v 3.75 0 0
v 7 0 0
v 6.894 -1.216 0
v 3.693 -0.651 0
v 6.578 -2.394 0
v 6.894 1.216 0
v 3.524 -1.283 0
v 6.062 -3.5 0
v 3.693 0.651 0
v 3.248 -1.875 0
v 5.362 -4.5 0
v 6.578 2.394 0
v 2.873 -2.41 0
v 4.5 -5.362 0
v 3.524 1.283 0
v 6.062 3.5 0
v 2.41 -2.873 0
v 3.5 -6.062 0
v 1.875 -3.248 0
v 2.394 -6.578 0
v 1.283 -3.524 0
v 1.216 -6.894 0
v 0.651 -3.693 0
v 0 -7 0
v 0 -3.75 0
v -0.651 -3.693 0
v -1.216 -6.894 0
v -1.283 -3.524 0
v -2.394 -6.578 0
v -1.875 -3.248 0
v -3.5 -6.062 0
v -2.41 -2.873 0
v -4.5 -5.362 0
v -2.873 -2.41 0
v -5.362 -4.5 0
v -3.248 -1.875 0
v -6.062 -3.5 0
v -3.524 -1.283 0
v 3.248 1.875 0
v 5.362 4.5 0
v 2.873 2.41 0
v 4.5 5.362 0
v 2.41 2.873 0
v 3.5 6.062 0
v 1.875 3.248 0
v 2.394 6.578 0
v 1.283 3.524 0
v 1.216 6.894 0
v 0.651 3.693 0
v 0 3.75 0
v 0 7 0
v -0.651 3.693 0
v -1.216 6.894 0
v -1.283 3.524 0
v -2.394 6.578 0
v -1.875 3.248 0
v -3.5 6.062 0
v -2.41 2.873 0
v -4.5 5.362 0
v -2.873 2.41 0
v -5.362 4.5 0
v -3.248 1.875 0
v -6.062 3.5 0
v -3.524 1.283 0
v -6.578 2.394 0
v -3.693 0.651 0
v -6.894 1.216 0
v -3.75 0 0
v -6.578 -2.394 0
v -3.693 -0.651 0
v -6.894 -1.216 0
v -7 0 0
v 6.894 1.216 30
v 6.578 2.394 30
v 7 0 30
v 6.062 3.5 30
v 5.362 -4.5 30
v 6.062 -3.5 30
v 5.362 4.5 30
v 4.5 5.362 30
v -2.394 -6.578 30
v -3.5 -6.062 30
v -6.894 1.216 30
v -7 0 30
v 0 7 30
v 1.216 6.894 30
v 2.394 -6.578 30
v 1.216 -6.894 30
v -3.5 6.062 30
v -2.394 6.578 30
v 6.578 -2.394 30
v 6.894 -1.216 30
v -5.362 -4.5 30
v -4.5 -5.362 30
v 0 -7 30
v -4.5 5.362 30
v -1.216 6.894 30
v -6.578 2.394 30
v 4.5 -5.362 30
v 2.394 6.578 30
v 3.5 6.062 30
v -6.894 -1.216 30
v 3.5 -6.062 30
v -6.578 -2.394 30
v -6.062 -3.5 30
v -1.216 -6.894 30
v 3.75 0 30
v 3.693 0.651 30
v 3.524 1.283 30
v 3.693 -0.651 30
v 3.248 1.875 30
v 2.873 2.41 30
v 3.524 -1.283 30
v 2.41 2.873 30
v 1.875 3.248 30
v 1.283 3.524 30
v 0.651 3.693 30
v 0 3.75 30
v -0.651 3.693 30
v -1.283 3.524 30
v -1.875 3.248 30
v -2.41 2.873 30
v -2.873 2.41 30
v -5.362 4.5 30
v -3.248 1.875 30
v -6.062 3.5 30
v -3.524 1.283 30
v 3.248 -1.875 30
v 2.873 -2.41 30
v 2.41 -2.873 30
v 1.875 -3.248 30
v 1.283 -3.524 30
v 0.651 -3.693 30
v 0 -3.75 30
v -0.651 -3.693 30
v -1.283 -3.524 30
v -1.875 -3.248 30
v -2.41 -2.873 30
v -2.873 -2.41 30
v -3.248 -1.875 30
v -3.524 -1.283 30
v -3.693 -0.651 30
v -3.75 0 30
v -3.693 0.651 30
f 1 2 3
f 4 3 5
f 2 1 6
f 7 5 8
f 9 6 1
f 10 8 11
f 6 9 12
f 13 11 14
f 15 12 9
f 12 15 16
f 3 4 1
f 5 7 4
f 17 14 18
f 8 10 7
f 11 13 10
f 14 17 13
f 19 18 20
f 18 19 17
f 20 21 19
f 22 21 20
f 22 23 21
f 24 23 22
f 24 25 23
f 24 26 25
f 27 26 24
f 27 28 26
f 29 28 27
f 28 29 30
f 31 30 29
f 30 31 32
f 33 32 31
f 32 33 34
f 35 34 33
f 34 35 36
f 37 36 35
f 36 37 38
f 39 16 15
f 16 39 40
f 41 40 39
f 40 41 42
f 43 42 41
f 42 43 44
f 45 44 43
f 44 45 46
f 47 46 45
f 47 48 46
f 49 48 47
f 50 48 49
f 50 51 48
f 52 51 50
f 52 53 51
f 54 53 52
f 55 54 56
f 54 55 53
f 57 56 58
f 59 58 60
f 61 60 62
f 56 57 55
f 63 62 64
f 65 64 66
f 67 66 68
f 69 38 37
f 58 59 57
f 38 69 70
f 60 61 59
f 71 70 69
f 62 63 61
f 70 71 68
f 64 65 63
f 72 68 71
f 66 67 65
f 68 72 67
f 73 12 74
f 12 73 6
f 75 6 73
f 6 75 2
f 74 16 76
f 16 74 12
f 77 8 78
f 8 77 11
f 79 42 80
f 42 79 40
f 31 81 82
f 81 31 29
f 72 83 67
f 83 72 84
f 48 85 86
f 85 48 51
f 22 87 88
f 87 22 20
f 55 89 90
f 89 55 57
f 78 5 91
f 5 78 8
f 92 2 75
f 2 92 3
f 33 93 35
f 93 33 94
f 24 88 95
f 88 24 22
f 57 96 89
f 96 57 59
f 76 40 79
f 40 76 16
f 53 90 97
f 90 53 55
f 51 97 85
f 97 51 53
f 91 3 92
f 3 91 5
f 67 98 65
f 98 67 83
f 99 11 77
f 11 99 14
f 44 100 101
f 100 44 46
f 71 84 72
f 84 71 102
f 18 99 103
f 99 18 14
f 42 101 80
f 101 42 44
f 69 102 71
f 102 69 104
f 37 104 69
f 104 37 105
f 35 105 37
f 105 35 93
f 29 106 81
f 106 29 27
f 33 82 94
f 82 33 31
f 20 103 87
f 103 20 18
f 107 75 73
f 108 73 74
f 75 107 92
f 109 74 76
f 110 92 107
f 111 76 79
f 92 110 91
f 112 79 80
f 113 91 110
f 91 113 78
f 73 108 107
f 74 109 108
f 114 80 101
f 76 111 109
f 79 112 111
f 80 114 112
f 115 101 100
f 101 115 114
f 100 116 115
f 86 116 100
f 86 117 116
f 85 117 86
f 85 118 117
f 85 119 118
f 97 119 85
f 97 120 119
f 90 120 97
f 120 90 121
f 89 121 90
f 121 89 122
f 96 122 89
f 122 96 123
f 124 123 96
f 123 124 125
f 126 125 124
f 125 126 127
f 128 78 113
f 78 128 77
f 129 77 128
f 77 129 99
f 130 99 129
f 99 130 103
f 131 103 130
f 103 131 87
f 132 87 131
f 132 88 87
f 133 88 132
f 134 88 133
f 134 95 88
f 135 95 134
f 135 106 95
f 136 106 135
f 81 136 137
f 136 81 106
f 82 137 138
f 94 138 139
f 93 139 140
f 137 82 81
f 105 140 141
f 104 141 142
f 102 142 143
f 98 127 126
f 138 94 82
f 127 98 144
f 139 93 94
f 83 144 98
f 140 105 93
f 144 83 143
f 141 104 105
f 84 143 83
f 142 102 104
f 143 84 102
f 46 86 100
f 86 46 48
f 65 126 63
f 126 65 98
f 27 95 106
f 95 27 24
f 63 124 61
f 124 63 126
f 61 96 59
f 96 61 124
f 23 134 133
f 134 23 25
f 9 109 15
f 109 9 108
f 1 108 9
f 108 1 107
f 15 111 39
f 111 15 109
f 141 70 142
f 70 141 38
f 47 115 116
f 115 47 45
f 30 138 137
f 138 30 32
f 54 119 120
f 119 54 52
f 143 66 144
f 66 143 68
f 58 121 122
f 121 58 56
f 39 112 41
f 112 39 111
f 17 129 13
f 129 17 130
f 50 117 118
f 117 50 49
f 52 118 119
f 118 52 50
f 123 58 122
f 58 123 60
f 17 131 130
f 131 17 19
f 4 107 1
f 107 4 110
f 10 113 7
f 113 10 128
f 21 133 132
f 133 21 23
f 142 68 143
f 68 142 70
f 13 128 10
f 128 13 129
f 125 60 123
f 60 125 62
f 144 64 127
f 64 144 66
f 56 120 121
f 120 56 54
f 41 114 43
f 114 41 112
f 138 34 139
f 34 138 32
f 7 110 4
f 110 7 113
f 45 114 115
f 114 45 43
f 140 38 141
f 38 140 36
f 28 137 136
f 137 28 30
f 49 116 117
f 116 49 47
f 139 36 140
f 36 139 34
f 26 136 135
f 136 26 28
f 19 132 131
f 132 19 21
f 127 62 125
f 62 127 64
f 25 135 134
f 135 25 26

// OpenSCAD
//---------------------------------------------------------------------------------------------
//-- Printable holder for washer
//-- (c) Martin Korinek	m.ko@inode.at
//-- Jan-2015
//---------------------------------------------------------------------------------------------
//--
//---------------------------------------------------------------------------------------------

//fragment minimum angle
  $fa=10.0;

//fragment minimum size
  $fs=0.2;
  
  heigth =30;
  
difference()
{  
	cylinder(h = heigth, d = 14);
	translate([0,0,-1])
	cylinder(h = heigth+2, d = 7.5);

} 
